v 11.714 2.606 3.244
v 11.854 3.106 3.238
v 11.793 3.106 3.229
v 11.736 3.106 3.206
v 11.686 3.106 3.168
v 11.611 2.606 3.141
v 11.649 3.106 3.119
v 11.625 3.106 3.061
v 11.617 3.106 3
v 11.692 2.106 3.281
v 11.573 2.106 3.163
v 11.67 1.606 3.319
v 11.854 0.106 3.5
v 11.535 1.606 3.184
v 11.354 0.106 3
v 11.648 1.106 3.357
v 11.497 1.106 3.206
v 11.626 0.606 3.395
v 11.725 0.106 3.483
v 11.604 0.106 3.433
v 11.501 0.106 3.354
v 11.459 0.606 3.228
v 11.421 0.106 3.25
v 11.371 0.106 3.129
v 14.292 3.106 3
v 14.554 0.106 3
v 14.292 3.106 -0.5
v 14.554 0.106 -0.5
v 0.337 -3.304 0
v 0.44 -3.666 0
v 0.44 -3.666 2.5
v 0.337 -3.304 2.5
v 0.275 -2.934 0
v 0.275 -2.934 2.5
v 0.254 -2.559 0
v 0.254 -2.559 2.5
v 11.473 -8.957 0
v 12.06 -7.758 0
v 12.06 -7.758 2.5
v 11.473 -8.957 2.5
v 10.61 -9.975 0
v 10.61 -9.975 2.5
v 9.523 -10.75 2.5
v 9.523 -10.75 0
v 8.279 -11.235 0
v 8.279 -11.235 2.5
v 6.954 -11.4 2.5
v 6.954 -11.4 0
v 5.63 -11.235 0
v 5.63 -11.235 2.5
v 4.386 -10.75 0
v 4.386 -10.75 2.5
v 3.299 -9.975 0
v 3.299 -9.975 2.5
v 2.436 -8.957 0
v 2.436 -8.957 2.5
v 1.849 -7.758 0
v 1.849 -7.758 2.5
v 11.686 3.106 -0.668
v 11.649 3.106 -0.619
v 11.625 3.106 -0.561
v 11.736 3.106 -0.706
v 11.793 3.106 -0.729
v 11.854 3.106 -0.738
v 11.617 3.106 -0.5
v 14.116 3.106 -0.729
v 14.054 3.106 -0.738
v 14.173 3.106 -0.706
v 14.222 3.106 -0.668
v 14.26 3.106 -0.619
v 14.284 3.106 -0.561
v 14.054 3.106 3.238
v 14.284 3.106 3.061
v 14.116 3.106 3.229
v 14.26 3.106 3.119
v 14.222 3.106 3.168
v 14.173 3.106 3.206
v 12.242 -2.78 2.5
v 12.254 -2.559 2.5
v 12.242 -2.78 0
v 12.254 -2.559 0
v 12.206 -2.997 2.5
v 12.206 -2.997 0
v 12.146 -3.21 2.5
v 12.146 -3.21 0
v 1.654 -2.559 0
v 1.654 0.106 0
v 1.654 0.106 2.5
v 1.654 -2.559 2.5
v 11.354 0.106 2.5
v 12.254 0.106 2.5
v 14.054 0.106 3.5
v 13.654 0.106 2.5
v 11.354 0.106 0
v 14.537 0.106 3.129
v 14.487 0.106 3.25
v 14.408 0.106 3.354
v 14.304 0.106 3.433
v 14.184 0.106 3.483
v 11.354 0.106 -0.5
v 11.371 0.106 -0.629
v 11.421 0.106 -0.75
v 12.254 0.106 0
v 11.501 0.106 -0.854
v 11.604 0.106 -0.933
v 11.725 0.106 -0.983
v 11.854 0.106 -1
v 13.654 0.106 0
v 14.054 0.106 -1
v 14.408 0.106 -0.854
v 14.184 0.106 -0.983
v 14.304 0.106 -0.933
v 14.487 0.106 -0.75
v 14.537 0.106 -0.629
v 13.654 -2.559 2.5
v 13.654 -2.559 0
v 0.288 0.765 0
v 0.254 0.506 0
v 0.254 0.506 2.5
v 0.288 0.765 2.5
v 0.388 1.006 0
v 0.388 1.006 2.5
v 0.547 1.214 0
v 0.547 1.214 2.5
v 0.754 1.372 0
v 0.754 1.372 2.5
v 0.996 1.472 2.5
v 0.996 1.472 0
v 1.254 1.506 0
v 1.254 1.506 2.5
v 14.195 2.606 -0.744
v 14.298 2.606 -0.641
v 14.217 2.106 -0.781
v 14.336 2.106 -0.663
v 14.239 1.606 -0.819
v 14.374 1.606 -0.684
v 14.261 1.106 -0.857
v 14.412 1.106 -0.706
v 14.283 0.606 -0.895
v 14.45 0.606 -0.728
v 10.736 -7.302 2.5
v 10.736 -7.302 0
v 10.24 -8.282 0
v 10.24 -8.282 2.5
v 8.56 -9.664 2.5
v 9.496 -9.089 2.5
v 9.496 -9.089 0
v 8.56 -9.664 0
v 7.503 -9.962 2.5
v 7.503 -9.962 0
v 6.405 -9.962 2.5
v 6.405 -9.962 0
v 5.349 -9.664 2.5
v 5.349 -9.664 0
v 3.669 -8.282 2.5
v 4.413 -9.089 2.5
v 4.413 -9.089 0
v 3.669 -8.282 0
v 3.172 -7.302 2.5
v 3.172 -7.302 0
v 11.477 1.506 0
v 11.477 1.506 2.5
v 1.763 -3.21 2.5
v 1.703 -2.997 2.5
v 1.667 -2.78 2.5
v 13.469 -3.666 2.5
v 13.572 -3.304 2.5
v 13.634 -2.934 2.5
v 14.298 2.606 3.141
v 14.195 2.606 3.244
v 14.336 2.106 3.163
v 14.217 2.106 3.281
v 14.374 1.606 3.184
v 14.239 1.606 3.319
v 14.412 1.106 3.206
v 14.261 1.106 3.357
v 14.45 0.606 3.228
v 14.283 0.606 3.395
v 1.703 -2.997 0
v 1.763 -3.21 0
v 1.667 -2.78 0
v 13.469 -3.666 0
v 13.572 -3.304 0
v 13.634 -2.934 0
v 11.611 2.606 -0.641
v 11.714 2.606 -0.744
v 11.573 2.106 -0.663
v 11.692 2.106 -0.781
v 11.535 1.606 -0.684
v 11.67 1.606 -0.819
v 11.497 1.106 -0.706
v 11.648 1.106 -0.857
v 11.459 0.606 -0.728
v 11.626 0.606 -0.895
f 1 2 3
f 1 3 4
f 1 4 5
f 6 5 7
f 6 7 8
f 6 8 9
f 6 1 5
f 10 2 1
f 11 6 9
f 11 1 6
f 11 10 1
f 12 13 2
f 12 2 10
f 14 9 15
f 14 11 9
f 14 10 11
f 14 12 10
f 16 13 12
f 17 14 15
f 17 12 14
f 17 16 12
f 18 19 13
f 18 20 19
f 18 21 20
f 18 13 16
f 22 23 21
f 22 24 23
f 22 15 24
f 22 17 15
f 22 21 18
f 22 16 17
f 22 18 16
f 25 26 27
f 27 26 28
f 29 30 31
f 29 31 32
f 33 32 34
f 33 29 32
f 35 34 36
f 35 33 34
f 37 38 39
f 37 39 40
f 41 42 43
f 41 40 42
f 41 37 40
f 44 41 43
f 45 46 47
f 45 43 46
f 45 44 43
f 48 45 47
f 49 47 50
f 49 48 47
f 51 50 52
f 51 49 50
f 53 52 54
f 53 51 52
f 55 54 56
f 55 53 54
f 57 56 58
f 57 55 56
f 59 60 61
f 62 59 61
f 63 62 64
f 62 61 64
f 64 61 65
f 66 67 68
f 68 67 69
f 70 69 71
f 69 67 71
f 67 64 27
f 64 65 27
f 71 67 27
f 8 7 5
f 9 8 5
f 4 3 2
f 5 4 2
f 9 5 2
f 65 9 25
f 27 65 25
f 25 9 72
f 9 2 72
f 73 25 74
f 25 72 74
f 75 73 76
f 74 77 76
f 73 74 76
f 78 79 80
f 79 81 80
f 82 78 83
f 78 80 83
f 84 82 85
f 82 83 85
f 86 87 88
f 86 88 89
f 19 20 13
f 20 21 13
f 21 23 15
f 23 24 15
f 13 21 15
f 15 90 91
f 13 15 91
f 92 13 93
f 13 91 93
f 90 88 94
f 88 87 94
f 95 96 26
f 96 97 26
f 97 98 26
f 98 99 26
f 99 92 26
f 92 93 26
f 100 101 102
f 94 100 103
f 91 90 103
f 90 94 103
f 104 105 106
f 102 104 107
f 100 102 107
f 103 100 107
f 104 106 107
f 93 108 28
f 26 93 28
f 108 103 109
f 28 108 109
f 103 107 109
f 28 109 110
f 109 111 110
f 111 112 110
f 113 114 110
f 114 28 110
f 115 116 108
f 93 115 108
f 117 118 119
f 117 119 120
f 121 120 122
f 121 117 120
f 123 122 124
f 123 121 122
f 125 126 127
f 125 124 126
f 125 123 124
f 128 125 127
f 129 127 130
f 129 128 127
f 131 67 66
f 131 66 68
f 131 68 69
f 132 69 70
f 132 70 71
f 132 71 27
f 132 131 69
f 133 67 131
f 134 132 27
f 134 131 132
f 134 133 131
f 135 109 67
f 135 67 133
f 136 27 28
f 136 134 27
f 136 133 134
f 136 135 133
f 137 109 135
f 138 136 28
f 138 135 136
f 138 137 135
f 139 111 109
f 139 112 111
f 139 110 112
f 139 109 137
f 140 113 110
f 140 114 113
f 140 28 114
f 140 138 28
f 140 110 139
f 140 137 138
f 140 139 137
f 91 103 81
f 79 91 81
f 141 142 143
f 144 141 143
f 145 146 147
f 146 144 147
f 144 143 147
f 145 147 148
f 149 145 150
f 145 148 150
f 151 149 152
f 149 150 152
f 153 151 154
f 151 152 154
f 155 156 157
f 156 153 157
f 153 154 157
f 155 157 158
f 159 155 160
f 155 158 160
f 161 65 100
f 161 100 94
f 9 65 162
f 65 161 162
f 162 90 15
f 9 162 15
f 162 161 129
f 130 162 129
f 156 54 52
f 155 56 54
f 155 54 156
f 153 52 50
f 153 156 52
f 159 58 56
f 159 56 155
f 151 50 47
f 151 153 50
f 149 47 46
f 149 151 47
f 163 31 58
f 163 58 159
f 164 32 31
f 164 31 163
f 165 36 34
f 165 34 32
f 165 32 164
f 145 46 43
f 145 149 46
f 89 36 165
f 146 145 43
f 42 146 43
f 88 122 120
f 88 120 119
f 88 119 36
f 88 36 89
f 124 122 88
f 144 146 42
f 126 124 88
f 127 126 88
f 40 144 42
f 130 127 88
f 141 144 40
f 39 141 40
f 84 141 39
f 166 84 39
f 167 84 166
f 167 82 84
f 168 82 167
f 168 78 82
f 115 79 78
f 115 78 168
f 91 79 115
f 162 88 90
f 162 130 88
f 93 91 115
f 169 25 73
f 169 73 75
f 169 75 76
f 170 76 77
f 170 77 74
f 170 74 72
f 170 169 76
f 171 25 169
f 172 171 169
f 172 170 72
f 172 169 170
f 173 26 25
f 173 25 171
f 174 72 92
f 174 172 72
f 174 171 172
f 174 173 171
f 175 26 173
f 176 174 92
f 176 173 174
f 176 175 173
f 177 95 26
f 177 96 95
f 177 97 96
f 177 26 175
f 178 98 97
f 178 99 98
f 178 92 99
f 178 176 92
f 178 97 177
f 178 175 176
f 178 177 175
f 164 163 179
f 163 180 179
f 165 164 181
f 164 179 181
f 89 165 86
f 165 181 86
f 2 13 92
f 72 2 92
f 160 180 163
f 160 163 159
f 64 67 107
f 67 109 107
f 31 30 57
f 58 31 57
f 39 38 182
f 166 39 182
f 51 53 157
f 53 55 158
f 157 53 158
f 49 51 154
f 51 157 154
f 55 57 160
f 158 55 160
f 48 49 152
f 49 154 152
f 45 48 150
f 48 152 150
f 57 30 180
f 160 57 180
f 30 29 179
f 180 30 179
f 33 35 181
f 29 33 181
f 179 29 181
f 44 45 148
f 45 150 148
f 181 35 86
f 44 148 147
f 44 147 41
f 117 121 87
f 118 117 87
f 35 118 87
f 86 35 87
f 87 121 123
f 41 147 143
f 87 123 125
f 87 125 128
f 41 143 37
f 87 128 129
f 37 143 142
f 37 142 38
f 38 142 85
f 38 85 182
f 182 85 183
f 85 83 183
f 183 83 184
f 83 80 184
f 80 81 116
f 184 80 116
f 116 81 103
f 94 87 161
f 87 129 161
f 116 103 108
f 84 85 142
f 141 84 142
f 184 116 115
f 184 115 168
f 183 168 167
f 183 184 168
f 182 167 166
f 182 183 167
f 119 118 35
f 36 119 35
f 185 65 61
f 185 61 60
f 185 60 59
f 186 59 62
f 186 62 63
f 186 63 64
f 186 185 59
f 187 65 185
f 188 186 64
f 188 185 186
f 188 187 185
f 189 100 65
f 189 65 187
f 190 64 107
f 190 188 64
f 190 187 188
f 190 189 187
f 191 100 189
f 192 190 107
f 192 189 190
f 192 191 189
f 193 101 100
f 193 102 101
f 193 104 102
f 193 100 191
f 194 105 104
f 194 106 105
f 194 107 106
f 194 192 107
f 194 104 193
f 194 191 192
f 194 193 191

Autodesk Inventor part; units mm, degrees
ref_plane "YZ Plane" through (0, 0, 0) normal (1, 0, 0) x (0, 1, 0)
ref_plane "XZ Plane" through (0, 0, 0) normal (0, 1, 0) x (-1, 0, 0)
ref_plane "XY Plane" through (0, 0, 0) normal (0, 0, 1) x (1, 0, 0)
sketch "Sketch1" plane through (0, 0, 0) normal (0, 0, 1) x (1, 0, 0)
  arc A0 (3.1723, -7.3022) -> (10.7365, -7.3022) centre (6.9544, -6) ccw
  line L0 (1.6544, 0.1064) -> (1.6544, -2.5589)
  line L1 (1.6544, 0.1064) -> (12.2544, 0.1064)
  line L2 (12.2544, 0.1064) -> (12.2544, -2.5589)
  line L3 (1.7634, -3.21) -> (3.1723, -7.3022)
  line L4 (12.1455, -3.21) -> (10.7365, -7.3022)
  arc A1 (1.6544, -2.5589) -> (1.7634, -3.21) centre (3.6544, -2.5589) ccw
  arc A2 (12.1455, -3.21) -> (12.2544, -2.5589) centre (10.2544, -2.5589) ccw
  line L5 (12.0603, -7.7579) -> (13.4692, -3.6658)
  arc A3 (13.4692, -3.6658) -> (13.6544, -2.5589) centre (10.2544, -2.5589) ccw
  line L6 (13.6544, -2.5589) -> (13.6544, 1.5064)
  line L7 (13.6544, 1.5064) -> (1.2544, 1.5064)
  line L8 (0.2544, 0.5064) -> (0.2544, -2.5589)
  arc A4 (0.2544, -2.5589) -> (0.4396, -3.6658) centre (3.6544, -2.5589) ccw
  line L9 (0.4396, -3.6658) -> (1.8486, -7.7579)
  arc A5 (1.8486, -7.7579) -> (12.0603, -7.7579) centre (6.9544, -6) ccw
  arc A6 (1.2544, 1.5064) -> (0.2544, 0.5064) centre (1.2544, 0.5064) ccw
  point P0 (1.6544, -2.8936)
  point P1 (12.2544, -2.8936)
  point P2 (13.6544, 0.2)
  point P3 (12.7544, 1.5064)
  dimension "d12" = 4
  dimension "d13" = 3
  dimension "d14" = 3
  dimension "d16" = 2
  dimension "d17" = 1.4
  dimension "d18" = 1
  dimension "d35" = 10.6
extrude "Extrusion1" add sketch "Sketch1" along normal blind 2.5
sketch "Sketch3" plane through (1.6544, 0.1064, 2.5) normal (0, -1, 0) x (1, 0, 0)
  line L0 (10.2, 1) -> (12.4, 1)
  line L1 (12.9, 0.5) -> (12.9, -3)
  line L2 (12.4, -3.5) -> (10.2, -3.5)
  line L3 (9.7, -3) -> (9.7, 0.5)
  arc A0 (12.9, 0.5) -> (12.4, 1) centre (12.4, 0.5) ccw
  arc A1 (12.4, -3.5) -> (12.9, -3) centre (12.4, -3) ccw
  arc A2 (9.7, -3) -> (10.2, -3.5) centre (10.2, -3) ccw
  arc A3 (10.2, 1) -> (9.7, 0.5) centre (10.2, 0.5) ccw
  line L4 (-1.4, -2.5) -> (-1.4, 0) projected
  point P0 (9.7, 1)
  point P1 (12.9, -3.5)
  point P2 (12.9, 1)
  point P3 (9.7, -3.5)
  dimension "d21" = 4.5
  dimension "d22" = 3.2
  dimension "d27" = 0.5
  dimension "d36" = 11.1
extrude "Extrusion2" add sketch "Sketch3" against normal blind 3 draft -5
properties part number "fastener_01"
